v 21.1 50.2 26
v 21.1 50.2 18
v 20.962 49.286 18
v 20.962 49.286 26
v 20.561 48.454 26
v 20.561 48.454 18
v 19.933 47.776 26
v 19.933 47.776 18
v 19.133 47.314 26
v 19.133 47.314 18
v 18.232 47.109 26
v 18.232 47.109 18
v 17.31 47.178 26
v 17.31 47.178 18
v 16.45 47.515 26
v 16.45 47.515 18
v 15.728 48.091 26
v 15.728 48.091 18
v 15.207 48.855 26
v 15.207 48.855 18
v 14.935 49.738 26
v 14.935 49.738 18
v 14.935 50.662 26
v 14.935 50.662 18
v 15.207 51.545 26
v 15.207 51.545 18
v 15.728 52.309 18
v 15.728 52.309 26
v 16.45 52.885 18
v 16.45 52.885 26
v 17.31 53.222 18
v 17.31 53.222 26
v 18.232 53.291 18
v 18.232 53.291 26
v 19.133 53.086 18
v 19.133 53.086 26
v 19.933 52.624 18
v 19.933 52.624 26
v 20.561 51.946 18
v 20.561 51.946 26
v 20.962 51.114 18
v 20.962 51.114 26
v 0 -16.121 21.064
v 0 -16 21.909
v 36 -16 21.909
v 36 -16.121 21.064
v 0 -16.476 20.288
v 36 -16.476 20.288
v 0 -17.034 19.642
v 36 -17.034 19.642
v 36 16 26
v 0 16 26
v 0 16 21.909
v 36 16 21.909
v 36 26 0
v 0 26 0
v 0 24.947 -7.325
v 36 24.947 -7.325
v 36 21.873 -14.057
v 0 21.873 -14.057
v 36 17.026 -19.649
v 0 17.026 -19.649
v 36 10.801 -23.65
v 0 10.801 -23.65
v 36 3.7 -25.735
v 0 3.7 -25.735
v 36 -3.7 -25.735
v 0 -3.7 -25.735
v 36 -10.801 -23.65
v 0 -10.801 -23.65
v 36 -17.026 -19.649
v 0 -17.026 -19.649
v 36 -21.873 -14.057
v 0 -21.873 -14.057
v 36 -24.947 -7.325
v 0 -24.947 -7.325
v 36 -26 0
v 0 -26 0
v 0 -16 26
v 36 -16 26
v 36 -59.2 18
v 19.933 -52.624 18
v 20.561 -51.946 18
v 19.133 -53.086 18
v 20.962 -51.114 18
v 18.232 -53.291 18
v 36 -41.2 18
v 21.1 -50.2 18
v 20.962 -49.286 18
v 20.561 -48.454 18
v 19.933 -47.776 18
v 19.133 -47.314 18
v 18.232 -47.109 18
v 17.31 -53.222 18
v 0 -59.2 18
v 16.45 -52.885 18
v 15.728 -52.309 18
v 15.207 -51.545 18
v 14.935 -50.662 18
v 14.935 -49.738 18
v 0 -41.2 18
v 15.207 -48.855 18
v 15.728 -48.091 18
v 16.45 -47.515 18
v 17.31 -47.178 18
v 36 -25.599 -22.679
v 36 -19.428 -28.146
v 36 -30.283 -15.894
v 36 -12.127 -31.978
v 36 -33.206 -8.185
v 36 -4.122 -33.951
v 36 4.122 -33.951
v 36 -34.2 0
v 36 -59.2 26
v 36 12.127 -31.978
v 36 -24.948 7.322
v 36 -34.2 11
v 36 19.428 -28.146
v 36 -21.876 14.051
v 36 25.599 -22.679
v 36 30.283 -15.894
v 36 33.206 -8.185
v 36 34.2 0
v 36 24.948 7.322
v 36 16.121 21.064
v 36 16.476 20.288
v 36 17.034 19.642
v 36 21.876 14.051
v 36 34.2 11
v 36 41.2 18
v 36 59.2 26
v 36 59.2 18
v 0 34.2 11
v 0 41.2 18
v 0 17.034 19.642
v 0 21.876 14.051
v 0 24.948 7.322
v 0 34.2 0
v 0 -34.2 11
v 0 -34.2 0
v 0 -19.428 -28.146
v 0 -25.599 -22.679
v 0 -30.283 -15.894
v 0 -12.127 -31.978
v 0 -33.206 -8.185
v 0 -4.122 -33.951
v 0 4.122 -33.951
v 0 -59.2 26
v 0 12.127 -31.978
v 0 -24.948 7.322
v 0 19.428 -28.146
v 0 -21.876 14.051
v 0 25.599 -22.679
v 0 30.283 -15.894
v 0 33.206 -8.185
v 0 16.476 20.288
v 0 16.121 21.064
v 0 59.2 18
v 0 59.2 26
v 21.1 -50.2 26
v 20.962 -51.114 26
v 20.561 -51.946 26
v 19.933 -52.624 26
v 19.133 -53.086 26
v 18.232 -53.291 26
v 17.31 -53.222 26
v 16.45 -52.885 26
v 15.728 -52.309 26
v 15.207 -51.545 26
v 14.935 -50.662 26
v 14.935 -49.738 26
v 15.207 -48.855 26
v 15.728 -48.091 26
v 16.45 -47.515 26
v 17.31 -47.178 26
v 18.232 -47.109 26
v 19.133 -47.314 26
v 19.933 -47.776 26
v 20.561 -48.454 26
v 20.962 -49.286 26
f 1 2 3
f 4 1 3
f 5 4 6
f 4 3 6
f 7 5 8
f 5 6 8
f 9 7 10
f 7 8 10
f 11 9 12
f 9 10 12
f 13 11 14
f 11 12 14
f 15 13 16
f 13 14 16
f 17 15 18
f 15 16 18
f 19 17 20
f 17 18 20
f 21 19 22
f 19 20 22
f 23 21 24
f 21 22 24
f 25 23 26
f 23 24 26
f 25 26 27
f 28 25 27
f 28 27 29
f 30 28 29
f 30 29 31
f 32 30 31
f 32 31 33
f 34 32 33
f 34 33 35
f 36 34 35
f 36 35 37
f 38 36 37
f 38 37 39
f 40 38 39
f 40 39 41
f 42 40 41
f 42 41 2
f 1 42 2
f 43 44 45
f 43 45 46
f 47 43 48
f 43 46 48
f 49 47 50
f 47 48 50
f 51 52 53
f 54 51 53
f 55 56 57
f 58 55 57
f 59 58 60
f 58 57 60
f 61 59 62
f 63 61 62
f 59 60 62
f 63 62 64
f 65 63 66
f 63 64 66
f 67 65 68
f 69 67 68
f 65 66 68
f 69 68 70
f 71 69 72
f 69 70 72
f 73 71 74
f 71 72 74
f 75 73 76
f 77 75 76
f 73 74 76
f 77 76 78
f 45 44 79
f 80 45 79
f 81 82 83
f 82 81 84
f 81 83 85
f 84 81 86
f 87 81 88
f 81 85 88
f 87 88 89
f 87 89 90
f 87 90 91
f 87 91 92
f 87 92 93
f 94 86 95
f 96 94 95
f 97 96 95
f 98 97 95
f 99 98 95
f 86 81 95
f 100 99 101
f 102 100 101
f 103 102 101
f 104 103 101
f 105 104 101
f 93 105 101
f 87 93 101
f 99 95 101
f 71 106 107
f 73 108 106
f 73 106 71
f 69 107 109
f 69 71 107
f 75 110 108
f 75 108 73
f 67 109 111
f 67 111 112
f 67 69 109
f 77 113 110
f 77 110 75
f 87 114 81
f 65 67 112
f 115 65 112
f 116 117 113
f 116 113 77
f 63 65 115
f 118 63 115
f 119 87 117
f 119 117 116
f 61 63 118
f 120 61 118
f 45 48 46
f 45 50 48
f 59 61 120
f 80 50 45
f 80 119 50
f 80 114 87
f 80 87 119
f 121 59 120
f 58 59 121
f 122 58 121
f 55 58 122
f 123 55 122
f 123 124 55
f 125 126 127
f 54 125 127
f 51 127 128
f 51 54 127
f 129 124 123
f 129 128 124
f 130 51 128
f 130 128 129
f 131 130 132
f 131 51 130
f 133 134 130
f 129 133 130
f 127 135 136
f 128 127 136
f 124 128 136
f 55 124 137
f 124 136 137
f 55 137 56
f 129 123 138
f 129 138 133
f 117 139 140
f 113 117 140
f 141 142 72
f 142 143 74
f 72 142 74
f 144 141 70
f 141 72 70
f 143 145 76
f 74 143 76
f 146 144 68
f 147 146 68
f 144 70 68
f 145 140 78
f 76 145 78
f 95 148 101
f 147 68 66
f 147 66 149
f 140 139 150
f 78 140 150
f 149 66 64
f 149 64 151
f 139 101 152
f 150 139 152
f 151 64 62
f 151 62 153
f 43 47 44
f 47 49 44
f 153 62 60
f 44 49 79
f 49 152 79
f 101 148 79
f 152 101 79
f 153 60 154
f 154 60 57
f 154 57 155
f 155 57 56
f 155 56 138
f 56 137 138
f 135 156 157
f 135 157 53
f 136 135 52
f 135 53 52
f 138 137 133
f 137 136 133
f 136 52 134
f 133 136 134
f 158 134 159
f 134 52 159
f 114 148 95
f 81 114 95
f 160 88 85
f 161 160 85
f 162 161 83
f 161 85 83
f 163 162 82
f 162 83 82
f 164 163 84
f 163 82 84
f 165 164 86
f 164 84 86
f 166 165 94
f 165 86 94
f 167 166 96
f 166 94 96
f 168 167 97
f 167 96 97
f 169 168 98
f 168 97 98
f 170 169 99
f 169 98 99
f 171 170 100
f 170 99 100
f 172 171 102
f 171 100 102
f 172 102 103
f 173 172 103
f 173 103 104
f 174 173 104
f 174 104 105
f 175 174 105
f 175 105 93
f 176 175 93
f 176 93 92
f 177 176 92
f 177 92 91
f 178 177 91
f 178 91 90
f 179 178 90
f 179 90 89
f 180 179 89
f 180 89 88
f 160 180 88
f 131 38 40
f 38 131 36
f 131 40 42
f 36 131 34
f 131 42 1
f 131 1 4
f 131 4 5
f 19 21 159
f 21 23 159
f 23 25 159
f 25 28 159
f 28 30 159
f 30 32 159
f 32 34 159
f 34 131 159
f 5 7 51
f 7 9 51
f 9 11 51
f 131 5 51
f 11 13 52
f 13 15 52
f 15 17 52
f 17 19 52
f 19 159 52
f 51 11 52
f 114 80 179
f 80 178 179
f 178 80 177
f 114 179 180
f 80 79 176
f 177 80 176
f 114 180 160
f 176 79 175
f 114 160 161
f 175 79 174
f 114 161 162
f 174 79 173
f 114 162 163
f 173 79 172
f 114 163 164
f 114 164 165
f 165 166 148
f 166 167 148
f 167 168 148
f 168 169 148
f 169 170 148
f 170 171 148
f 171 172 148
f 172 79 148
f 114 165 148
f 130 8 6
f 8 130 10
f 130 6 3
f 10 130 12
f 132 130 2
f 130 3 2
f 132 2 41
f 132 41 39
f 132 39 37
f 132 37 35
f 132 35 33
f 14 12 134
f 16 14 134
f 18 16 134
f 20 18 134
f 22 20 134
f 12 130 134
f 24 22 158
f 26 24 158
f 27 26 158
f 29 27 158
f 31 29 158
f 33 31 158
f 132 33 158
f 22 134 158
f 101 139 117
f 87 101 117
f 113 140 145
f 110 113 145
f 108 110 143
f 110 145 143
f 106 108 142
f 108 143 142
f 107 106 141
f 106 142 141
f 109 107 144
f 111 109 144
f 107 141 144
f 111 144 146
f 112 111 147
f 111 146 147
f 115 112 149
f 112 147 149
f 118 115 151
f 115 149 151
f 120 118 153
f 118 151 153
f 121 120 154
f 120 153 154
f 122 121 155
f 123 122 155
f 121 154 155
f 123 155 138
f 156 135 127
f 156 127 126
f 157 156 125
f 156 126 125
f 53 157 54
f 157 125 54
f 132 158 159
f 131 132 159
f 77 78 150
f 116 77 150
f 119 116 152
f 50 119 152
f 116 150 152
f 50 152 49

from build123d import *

# Parameters (mm, degrees)
F1_DEPTH = 36
F2_R     = 3.1
F3_DEPTH = 8.001
F4_SIZE  = 7
F5_R     = 3


with BuildPart() as f1:
    # F0 (on Right) → F1 (new body)
    with BuildSketch(Plane.YZ):
        with BuildLine():
            Line((-16, 26), (-26, 26))
            Line((-26, 26), (-59.2, 26))
            Line((-59.2, 26), (-59.2, 18))
            Line((-59.2, 18), (-34.2, 18))
            Line((-34.2, 18), (-34.2, 0))
            ThreePointArc((-34.2, 0), (0, -34.2), (34.2, 0))
            Line((34.2, 0), (34.2, 18))
            Line((34.2, 18), (59.2, 18))
            Line((59.2, 18), (59.2, 26))
            Line((59.2, 26), (26, 26))
            Line((26, 26), (16, 26))
            Line((16, 26), (16, 20.493902))
            ThreePointArc((16, 20.493902), (23.366643, 11.401754), (26, 0))
            ThreePointArc((26, 0), (0, -26), (-26, 0))
            ThreePointArc((-26, 0), (-23.366643, 11.401754), (-16, 20.493902))
            Line((-16, 20.493902), (-16, 26))
        make_face()
    extrude(amount=F1_DEPTH)

    # F2 (on face) → F3 (cut, through all)
    with BuildSketch(Plane(origin=(0, 0, 18), x_dir=(1, 0, 0), z_dir=(0, 0, -1))):
        with Locations((18, 50.2)):
            Circle(F2_R)
        with Locations((18, -50.2)):
            Circle(F2_R)
    extrude(amount=-F3_DEPTH, mode=Mode.SUBTRACT)

    # F4
    f4_edges = [f1.edges().sort_by_distance(p)[0] for p in [
        (18, -34.2, 18),
        (18, 34.2, 18),
    ]]
    chamfer(f4_edges, length=F4_SIZE)

    # F5
    f5_edges = [f1.edges().sort_by_distance(p)[0] for p in [
        (18, 16, 20.493902),
        (18, -16, 20.493902),
    ]]
    fillet(f5_edges, radius=F5_R)


solid = f1.part
